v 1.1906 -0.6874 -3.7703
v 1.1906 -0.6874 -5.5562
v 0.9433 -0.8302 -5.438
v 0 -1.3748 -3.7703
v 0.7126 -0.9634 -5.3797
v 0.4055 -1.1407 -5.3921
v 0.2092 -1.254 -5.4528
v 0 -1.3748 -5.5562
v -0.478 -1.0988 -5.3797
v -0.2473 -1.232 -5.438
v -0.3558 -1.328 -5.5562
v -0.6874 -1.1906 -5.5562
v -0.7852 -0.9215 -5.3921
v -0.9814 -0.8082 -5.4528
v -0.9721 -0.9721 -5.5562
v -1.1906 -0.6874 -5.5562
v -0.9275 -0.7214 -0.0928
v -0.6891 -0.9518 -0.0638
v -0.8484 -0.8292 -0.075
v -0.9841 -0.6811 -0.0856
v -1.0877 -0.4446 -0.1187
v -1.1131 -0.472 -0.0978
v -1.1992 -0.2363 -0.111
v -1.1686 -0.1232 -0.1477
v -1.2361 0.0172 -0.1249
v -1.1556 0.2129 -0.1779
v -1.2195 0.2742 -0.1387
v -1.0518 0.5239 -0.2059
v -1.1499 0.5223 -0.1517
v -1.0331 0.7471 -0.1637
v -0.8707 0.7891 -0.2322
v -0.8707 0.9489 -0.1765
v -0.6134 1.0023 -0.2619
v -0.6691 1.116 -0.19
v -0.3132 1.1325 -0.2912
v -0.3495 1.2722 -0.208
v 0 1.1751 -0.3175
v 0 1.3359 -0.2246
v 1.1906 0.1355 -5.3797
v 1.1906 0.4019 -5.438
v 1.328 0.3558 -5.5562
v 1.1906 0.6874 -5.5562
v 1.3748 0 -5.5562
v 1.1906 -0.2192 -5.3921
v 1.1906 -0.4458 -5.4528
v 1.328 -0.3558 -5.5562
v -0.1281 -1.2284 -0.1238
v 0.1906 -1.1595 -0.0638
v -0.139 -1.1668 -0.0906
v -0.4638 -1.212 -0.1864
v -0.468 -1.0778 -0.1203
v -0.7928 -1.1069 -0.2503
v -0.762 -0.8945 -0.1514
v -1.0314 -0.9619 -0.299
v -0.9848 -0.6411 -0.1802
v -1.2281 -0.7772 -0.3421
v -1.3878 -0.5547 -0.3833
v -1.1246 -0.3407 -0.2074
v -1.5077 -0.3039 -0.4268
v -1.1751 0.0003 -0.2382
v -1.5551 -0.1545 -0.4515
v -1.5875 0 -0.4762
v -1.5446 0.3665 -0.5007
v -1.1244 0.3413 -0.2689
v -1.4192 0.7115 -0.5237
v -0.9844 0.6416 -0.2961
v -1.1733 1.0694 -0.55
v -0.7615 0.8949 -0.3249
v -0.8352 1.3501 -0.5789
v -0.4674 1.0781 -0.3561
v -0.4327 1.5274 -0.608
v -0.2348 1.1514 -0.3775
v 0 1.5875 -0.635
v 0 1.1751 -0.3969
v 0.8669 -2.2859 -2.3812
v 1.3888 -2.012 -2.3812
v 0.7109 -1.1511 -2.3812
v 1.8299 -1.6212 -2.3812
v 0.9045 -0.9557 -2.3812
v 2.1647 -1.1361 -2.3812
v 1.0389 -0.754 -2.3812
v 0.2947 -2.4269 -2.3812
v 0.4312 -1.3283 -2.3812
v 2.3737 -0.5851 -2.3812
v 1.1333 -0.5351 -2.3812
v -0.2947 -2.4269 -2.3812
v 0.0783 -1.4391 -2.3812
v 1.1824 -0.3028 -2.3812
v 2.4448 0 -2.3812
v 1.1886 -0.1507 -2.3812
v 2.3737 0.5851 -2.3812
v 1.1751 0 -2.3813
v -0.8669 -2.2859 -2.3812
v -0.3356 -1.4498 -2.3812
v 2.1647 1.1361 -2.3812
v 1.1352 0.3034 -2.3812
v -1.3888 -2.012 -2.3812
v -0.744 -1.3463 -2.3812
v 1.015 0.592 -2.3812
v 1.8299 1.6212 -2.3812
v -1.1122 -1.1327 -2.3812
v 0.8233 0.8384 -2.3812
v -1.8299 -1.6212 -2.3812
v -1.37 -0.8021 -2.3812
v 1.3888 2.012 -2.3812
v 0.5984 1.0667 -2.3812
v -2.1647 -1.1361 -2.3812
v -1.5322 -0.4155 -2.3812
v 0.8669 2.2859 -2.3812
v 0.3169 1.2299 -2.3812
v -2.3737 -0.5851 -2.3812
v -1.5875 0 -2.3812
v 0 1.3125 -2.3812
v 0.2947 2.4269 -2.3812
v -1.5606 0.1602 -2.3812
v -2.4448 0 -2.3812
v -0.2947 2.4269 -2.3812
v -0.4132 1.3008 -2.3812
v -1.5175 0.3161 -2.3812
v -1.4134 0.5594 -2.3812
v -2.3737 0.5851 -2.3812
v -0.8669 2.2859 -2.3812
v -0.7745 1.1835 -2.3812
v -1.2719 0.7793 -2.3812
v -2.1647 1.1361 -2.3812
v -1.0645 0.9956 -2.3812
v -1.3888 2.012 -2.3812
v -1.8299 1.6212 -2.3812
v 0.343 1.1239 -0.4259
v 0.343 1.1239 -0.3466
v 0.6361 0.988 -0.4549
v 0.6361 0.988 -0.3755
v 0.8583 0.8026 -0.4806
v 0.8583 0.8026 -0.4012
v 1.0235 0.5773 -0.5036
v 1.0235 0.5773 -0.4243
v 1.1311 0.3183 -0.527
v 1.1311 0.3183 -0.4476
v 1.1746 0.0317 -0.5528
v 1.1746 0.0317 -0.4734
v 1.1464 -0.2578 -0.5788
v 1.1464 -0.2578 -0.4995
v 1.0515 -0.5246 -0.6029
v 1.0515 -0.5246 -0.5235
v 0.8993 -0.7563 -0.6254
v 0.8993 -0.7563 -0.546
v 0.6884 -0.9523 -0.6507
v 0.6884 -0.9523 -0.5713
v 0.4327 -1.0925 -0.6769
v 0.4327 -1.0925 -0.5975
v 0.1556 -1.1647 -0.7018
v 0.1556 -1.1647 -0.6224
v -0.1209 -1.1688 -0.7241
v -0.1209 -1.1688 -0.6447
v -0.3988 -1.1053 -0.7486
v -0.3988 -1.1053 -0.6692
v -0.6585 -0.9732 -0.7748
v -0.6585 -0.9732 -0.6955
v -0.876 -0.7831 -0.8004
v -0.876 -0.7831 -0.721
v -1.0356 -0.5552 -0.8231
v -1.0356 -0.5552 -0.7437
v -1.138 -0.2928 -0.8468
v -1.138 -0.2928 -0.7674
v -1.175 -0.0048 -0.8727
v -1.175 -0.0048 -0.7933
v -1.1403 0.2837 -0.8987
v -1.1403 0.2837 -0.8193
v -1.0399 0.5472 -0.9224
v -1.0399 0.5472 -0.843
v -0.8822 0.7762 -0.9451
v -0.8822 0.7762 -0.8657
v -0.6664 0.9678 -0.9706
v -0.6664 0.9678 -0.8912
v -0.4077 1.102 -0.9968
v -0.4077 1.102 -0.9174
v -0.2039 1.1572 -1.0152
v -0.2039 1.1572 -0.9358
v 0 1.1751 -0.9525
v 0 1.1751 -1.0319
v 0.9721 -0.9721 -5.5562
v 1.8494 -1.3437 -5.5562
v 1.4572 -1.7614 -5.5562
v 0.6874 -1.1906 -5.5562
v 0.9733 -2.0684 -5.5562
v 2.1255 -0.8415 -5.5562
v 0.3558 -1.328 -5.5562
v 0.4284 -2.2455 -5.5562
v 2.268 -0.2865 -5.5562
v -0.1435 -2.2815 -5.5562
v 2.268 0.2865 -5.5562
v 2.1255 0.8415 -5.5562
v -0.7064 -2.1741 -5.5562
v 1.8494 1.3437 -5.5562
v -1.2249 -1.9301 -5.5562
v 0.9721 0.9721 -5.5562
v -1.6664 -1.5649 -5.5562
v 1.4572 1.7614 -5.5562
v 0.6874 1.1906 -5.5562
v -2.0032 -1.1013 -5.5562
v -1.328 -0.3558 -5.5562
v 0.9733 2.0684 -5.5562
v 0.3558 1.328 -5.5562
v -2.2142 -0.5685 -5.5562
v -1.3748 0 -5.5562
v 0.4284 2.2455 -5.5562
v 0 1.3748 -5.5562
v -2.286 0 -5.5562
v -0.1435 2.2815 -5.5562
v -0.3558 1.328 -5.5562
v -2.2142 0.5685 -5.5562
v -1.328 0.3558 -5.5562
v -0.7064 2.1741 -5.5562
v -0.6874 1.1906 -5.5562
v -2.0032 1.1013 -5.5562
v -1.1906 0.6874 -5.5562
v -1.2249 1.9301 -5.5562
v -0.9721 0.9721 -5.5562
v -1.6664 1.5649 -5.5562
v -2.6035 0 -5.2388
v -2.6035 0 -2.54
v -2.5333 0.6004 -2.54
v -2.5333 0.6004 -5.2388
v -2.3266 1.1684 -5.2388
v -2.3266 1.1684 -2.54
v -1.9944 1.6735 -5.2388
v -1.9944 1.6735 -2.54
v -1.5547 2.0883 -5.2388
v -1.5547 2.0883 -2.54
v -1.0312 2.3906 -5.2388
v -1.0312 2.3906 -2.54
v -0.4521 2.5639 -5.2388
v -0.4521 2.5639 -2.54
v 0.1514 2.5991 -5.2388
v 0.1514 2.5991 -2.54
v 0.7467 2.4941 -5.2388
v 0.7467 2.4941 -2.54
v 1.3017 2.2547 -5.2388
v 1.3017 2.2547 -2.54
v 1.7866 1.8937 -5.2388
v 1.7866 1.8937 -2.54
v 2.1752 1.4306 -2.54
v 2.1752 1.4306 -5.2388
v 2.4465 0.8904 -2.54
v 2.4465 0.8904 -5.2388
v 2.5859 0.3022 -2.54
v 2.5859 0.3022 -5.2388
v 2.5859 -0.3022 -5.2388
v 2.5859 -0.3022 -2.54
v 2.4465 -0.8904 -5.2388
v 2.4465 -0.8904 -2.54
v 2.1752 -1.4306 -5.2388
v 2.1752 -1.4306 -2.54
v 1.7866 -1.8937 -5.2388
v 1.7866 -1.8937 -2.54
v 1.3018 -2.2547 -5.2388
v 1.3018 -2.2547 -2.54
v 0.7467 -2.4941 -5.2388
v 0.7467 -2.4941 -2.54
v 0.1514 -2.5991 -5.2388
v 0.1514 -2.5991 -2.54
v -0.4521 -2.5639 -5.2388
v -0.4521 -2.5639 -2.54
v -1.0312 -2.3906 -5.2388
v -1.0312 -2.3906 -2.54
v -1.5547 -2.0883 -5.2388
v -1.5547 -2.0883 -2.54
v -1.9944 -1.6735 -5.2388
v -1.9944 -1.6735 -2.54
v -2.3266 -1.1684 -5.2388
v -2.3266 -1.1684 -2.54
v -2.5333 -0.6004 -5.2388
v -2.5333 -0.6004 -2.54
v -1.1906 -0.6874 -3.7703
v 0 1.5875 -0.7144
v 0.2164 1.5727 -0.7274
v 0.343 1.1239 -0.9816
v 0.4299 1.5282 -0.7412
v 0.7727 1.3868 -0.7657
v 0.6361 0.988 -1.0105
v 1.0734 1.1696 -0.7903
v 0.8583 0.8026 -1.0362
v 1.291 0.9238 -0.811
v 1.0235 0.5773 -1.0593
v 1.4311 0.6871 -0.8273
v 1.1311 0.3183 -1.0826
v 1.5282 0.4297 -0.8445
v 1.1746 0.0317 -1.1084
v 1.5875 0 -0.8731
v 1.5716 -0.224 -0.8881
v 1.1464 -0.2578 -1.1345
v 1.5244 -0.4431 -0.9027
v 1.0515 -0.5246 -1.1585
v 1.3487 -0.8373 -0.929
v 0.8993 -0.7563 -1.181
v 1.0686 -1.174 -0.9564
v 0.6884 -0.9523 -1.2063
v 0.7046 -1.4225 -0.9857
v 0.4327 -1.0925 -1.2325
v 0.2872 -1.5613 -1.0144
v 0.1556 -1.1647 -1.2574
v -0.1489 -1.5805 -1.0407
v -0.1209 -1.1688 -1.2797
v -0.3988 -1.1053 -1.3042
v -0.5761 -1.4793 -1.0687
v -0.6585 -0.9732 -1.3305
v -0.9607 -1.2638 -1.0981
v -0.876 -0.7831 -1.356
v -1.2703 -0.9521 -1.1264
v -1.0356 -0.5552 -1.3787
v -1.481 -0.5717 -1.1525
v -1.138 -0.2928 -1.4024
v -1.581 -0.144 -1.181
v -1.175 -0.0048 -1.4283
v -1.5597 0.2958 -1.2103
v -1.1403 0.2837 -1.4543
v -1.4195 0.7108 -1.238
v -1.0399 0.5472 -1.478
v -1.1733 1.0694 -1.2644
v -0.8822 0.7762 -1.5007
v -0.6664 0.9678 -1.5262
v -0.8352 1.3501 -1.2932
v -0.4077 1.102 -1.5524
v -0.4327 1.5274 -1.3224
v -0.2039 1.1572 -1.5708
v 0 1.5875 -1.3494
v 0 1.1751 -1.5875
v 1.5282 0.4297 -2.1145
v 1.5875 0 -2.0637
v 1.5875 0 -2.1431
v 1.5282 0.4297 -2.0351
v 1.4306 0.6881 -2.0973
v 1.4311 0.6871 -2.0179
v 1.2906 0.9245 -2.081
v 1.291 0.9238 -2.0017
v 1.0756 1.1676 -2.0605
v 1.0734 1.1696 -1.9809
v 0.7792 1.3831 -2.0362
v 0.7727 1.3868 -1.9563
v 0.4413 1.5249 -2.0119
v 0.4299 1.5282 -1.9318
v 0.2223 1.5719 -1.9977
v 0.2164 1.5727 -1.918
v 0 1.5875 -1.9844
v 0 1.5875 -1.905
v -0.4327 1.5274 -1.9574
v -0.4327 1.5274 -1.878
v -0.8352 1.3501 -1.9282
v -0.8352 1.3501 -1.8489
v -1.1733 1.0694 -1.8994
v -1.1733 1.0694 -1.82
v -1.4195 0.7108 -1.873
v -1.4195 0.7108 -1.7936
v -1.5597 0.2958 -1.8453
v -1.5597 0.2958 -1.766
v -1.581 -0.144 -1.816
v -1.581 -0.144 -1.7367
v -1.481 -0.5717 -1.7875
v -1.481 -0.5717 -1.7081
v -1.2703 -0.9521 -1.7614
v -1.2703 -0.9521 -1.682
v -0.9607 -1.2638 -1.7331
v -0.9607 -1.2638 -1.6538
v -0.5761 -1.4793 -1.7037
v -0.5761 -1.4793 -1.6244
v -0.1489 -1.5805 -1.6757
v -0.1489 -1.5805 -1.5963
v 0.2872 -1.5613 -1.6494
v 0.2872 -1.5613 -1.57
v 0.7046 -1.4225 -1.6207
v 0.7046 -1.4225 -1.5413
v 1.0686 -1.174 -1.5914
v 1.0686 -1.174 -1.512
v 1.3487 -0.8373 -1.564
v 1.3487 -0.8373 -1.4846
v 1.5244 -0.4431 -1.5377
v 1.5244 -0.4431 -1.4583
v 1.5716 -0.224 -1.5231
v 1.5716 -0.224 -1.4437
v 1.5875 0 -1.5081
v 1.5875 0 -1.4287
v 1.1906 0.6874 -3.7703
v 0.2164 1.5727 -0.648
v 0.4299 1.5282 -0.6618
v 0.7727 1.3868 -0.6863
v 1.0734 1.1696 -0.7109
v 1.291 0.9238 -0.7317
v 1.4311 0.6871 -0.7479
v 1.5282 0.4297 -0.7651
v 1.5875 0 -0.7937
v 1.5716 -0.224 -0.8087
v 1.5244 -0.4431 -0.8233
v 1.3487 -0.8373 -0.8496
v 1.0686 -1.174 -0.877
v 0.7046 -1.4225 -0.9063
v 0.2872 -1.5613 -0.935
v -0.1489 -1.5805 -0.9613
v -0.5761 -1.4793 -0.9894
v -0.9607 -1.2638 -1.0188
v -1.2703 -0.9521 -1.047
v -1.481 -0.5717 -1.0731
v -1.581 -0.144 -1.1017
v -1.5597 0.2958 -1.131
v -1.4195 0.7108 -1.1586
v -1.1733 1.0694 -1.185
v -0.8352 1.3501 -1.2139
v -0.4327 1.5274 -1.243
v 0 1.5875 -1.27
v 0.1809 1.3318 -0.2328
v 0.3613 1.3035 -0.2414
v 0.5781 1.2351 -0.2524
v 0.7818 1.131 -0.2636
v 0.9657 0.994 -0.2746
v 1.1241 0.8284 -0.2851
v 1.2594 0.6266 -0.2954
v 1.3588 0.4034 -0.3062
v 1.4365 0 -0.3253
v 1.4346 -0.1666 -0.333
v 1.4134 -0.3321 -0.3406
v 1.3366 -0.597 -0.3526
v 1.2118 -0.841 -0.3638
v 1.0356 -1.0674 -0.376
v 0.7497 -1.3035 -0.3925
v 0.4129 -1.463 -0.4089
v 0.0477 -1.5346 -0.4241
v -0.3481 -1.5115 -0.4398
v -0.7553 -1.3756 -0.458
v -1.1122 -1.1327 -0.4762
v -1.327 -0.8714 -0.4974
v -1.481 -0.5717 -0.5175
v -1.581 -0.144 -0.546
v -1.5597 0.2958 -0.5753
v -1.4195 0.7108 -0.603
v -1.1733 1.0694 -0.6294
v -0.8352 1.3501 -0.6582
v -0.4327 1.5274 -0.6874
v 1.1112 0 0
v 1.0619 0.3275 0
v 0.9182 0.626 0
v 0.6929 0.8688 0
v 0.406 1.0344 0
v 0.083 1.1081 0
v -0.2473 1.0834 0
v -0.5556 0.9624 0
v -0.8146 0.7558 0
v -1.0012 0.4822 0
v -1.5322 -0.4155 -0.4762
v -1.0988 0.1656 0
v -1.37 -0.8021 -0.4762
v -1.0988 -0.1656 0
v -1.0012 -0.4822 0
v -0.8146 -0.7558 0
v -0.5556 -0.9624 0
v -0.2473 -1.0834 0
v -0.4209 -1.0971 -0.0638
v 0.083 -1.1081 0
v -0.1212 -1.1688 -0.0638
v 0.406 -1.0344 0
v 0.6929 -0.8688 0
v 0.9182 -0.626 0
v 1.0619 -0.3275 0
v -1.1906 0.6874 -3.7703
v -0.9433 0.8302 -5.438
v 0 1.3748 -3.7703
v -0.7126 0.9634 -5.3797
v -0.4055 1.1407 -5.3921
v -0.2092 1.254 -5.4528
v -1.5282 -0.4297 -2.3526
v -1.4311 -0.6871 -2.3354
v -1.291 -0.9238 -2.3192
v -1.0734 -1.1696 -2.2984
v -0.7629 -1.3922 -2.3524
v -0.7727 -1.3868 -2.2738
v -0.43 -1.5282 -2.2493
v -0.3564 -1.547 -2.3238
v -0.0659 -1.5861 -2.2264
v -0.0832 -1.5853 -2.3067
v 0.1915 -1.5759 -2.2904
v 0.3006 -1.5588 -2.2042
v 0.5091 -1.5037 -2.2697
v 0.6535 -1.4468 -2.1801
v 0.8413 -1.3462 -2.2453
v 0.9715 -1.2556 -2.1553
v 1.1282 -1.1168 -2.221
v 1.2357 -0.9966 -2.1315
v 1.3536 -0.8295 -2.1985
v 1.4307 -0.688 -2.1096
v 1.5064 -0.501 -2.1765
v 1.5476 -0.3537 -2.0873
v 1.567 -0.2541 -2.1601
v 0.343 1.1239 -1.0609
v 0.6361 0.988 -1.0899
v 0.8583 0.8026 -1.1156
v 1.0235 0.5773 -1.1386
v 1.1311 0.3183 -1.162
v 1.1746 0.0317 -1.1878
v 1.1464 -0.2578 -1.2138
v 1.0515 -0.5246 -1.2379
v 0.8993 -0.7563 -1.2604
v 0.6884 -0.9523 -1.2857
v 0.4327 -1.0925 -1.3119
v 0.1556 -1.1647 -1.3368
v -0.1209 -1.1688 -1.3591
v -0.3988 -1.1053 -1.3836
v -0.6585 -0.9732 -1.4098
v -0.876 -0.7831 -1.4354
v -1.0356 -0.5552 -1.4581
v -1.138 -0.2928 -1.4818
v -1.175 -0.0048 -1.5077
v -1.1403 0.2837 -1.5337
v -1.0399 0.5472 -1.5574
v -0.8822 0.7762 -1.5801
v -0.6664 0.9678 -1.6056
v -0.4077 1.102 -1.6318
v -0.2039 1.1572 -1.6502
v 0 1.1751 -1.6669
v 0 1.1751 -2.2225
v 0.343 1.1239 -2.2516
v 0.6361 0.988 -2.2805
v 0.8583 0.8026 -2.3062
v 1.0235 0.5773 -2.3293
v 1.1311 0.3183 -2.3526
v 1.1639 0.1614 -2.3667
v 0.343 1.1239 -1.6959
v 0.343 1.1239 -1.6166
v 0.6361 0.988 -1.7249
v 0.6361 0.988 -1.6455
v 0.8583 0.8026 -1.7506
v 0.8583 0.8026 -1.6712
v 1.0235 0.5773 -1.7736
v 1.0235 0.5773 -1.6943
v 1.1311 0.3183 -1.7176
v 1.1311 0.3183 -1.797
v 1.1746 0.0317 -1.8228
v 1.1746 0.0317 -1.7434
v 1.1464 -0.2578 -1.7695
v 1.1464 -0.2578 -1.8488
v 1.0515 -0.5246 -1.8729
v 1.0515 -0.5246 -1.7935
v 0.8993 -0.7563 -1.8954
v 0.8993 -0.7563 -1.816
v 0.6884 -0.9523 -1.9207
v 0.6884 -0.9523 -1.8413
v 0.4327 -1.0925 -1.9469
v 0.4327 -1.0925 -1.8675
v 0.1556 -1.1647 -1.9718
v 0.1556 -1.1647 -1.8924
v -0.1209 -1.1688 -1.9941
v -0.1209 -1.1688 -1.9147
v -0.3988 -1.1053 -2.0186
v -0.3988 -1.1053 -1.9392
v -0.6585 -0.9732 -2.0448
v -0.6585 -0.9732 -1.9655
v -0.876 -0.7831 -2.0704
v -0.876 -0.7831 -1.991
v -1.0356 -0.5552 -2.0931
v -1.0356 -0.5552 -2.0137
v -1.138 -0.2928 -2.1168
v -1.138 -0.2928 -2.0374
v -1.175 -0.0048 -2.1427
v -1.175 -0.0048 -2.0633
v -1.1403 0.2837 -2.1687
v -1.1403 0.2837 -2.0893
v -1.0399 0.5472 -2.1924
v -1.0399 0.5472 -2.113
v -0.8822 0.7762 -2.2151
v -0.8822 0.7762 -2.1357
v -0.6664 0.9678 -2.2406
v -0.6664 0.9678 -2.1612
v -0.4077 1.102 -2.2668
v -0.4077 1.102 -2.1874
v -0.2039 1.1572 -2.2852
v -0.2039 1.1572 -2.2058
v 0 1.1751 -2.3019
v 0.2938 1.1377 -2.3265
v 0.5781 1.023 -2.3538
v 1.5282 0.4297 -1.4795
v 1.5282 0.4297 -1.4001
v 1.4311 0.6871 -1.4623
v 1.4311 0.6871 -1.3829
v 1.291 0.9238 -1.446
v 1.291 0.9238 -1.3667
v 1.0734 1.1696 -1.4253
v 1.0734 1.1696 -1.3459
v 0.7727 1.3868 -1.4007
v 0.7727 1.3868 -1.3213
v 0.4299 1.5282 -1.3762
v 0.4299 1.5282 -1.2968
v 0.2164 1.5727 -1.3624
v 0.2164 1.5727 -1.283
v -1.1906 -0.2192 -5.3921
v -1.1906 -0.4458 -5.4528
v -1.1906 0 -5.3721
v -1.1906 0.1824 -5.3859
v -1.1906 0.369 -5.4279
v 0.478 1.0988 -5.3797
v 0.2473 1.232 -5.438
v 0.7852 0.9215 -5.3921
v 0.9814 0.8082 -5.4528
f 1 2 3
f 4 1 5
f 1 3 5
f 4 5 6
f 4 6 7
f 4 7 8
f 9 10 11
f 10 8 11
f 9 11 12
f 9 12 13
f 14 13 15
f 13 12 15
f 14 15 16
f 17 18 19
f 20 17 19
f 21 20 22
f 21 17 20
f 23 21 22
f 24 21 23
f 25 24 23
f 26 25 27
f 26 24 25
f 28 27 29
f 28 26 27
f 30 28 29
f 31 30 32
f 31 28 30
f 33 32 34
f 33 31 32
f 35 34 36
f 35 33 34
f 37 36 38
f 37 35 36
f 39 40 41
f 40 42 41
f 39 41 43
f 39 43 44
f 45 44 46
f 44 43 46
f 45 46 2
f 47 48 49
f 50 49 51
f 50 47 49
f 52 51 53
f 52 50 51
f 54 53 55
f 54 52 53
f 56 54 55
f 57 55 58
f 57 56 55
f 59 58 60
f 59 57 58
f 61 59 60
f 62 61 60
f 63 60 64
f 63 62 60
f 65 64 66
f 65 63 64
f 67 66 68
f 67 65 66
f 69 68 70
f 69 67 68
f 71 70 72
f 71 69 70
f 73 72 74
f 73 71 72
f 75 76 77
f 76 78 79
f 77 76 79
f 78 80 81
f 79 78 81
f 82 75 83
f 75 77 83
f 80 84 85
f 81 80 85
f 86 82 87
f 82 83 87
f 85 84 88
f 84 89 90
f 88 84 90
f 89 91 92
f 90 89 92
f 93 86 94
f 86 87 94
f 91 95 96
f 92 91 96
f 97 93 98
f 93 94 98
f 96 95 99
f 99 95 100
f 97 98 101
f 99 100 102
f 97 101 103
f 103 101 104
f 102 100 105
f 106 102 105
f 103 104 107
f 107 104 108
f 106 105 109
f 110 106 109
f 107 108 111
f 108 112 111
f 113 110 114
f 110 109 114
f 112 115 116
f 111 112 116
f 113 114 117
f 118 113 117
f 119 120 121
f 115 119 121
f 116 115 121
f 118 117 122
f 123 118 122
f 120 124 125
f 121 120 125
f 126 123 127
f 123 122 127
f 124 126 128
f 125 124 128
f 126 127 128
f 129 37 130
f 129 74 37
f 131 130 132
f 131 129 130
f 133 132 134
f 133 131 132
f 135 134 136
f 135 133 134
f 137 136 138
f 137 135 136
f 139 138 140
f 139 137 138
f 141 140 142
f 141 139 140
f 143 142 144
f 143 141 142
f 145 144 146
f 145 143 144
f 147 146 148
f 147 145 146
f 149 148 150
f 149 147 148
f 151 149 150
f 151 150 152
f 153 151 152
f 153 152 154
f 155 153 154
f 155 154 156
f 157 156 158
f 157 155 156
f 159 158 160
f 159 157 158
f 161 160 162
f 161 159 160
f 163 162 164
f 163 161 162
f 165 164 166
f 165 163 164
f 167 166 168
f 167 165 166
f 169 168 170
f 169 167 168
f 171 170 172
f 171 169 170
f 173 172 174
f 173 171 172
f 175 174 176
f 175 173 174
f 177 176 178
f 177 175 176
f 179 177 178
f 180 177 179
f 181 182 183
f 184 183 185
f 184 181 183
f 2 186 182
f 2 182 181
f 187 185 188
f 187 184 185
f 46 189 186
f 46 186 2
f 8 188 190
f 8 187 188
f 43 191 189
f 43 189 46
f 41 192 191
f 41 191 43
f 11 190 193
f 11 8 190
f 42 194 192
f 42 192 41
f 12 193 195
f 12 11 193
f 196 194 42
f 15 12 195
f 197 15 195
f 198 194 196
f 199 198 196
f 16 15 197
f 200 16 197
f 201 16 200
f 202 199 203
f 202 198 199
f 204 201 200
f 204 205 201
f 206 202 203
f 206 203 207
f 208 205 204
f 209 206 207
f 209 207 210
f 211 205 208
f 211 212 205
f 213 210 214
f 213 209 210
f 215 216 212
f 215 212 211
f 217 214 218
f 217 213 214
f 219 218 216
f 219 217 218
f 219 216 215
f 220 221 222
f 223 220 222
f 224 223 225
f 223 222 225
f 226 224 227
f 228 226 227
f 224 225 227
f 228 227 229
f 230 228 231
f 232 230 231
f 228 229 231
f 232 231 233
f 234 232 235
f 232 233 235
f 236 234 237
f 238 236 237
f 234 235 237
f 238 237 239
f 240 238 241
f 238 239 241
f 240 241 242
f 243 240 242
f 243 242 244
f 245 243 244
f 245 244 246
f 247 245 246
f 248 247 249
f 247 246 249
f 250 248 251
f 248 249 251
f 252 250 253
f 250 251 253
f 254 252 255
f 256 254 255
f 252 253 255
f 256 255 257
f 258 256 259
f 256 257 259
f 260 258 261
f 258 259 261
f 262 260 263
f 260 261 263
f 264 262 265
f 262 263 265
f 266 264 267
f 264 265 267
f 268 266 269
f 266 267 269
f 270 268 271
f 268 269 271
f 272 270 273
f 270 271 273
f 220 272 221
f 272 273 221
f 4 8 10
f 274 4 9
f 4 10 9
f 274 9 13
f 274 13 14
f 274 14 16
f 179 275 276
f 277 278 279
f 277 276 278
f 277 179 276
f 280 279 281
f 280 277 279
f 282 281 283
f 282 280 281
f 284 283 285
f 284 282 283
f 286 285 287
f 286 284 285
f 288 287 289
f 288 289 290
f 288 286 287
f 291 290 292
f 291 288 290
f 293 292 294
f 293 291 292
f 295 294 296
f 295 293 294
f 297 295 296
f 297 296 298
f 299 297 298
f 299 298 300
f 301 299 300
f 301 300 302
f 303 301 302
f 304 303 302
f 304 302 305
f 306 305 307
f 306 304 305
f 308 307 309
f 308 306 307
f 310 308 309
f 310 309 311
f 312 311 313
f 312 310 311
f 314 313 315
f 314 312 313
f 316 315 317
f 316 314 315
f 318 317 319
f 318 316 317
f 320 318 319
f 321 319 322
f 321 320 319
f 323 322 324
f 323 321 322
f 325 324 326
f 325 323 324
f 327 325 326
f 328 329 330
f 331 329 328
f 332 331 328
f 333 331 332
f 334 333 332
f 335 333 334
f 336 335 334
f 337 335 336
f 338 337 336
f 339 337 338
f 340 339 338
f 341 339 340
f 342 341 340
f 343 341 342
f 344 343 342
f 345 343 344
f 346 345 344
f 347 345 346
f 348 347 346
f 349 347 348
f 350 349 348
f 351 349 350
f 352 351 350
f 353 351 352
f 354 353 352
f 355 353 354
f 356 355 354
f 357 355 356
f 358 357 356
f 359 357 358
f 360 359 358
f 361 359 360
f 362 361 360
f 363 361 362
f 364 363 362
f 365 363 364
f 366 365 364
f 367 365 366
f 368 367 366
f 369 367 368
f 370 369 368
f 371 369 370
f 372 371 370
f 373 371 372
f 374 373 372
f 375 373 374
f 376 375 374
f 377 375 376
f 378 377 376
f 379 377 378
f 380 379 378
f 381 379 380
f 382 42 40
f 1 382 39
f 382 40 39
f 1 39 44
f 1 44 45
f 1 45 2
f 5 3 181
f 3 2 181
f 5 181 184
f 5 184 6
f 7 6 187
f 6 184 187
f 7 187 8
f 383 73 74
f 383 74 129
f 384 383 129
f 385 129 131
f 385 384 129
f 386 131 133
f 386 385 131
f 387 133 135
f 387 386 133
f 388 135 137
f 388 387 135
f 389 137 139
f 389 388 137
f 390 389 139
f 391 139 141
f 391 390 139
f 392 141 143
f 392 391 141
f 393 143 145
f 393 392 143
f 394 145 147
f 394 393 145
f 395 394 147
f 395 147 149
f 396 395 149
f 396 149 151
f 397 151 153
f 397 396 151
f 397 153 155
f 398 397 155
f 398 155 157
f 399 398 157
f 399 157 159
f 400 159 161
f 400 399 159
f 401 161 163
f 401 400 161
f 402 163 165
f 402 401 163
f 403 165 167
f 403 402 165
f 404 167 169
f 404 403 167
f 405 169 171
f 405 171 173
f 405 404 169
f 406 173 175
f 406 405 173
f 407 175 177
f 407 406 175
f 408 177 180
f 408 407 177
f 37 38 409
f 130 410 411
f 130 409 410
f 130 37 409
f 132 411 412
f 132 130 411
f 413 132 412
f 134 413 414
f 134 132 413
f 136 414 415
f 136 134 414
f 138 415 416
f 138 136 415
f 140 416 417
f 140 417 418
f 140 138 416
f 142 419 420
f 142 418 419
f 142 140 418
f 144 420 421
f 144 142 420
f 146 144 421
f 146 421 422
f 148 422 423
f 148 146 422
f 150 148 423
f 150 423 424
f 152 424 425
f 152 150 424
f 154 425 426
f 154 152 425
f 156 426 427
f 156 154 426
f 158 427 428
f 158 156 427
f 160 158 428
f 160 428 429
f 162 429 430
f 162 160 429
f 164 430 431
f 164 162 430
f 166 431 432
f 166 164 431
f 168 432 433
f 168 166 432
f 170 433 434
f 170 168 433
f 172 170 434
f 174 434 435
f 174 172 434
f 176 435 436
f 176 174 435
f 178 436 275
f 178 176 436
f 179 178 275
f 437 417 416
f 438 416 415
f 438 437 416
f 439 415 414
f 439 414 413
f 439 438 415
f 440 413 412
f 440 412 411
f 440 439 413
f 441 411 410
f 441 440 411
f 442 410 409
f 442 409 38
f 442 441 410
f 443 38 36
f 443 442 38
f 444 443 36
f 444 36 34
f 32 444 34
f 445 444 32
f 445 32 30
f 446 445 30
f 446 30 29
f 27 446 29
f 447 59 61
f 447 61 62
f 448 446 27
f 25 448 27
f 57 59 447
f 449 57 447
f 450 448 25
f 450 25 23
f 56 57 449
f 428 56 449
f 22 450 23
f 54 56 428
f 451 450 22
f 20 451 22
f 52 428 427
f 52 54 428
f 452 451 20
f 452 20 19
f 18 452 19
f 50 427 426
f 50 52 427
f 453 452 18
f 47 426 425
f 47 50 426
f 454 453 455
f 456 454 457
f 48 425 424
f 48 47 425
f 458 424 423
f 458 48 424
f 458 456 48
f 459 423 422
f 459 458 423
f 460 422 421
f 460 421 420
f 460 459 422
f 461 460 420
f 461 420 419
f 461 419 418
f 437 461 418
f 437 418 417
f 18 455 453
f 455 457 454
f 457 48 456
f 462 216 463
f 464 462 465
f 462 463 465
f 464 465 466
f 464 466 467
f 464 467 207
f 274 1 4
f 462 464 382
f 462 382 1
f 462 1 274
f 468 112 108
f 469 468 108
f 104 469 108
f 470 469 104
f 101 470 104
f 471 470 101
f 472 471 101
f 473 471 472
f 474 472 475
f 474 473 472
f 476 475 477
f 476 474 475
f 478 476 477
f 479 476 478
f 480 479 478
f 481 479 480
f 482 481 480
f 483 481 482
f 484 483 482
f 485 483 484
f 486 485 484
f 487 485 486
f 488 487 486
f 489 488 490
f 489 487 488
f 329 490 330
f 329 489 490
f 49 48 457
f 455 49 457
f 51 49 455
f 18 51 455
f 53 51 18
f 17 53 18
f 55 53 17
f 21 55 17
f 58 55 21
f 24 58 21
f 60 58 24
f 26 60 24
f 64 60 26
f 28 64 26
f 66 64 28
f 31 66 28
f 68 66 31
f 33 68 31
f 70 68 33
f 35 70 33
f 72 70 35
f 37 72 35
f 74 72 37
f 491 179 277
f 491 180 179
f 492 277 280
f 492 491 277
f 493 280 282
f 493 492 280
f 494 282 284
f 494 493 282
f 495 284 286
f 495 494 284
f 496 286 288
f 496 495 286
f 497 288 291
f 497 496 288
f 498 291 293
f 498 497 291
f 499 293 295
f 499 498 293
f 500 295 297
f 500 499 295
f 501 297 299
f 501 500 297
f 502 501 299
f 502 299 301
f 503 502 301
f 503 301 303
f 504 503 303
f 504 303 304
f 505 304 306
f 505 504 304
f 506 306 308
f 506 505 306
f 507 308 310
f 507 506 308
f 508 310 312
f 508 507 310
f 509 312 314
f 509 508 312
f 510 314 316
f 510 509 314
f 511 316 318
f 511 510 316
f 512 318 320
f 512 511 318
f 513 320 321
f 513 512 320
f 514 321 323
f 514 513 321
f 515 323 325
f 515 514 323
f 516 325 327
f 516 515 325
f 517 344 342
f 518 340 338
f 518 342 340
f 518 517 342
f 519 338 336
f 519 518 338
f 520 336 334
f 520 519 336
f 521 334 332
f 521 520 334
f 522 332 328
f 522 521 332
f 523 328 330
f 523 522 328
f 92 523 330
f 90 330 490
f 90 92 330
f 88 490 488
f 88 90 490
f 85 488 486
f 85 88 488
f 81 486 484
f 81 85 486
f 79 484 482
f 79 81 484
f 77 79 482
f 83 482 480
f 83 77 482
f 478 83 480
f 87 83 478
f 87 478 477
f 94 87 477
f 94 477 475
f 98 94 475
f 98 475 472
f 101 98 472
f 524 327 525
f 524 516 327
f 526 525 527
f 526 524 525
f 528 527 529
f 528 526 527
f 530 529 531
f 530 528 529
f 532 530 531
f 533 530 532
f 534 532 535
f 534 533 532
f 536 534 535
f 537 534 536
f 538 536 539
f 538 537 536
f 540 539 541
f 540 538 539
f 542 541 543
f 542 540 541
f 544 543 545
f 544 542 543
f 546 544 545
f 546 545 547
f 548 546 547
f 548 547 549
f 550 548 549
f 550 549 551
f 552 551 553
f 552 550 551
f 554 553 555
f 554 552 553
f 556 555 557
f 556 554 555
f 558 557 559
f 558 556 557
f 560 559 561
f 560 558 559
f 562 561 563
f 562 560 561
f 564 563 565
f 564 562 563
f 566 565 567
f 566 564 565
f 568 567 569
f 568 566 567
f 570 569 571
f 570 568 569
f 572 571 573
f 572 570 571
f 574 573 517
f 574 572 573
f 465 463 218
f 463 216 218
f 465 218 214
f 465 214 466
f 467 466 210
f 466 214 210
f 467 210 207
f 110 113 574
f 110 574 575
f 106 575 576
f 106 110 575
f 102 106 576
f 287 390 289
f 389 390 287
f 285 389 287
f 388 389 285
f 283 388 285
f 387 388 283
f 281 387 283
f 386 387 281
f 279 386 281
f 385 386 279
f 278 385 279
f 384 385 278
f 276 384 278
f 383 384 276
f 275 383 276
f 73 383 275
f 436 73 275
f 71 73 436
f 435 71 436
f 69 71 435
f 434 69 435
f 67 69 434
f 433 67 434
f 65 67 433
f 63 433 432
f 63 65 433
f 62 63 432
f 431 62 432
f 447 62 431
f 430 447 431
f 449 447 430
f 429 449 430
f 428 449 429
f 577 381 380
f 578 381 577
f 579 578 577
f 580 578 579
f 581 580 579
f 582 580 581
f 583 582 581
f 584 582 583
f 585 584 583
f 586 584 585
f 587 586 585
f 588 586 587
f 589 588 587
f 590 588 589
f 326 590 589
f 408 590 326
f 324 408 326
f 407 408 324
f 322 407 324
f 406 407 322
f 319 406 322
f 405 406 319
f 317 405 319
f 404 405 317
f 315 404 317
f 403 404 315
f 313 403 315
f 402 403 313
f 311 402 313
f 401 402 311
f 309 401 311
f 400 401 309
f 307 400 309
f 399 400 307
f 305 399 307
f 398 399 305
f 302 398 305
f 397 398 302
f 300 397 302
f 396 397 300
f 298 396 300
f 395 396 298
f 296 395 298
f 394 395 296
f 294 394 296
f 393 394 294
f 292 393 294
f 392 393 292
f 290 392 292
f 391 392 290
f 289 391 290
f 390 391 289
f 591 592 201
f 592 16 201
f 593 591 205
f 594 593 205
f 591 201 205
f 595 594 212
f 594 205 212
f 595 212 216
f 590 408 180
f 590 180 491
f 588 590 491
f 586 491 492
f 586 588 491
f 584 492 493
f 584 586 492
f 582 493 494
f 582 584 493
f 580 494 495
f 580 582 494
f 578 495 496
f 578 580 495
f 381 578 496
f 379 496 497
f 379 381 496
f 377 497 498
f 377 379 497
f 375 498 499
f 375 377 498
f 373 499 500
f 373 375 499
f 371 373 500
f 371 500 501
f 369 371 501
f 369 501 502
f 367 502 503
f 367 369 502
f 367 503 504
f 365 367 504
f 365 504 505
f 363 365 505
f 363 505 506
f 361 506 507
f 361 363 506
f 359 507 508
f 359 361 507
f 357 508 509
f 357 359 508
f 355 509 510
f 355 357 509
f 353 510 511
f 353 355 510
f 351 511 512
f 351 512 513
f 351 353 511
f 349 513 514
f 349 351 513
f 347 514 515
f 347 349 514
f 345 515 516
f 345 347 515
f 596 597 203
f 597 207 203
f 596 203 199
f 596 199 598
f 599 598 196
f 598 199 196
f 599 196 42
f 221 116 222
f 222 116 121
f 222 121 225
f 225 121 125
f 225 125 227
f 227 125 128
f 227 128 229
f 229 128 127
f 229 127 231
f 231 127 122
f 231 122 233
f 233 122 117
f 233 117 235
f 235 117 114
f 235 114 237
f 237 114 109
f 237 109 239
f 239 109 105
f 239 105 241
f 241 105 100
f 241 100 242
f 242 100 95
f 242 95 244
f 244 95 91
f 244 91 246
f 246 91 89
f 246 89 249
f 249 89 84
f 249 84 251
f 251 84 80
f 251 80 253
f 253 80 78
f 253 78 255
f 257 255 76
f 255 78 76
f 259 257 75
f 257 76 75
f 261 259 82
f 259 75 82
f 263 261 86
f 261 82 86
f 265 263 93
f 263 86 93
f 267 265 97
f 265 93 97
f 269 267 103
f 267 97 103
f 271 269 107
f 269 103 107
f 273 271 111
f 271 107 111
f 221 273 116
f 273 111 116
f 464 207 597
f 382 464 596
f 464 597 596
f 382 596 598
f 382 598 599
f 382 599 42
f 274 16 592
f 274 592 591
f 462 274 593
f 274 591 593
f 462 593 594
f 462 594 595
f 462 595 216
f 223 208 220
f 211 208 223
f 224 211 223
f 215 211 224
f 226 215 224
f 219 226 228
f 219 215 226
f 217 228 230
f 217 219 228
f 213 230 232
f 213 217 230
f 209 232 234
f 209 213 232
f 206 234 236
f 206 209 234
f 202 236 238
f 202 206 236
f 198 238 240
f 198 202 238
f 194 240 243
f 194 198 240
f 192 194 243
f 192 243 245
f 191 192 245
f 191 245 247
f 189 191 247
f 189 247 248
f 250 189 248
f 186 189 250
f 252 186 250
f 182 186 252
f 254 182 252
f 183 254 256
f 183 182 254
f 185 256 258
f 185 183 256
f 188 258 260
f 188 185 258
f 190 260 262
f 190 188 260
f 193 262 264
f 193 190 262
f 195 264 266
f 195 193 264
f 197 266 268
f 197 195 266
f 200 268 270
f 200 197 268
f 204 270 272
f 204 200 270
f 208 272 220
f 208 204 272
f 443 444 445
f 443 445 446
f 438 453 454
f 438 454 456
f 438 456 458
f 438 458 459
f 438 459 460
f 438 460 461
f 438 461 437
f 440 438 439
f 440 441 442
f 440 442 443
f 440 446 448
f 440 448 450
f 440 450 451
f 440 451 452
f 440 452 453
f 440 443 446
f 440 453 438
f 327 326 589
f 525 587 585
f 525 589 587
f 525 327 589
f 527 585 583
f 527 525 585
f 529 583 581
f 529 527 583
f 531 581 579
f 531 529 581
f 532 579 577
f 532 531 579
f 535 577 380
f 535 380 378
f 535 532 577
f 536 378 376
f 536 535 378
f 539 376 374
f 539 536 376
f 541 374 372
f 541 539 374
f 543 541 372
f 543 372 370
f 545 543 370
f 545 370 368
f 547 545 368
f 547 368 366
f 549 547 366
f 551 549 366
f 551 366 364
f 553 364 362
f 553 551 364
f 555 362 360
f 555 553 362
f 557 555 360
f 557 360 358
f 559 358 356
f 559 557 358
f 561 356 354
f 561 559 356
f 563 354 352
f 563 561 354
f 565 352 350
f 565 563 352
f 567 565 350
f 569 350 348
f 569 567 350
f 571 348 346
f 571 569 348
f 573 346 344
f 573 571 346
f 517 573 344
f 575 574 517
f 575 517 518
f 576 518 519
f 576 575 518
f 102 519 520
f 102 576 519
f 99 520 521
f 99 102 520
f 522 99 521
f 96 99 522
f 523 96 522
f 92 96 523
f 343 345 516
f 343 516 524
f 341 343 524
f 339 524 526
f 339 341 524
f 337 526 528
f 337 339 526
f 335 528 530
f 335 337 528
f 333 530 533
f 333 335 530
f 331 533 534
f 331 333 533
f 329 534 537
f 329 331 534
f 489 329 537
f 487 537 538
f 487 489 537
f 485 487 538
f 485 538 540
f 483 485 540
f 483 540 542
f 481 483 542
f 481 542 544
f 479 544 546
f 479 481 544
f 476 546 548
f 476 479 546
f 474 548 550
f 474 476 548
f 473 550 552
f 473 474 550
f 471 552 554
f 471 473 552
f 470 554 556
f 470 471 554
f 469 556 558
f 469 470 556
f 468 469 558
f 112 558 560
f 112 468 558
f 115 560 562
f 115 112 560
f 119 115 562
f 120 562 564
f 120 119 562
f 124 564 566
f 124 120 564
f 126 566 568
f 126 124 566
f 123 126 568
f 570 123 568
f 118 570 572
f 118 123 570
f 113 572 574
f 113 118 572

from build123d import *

# Parameters (mm, degrees)
SKETCH1_R          = 1.5875
EXTRUDE1_DEPTH     = 2.38125
CHAMFER3_SIZE      = 0.47625
CUT_SWEEP1_PITCH   = 0.635
SKETCH6_R          = 2.6035
EXTRUDE2_DEPTH     = 3.175
CUT_EXTRUDE1_DEPTH = 1.7859375
SKETCH8_R          = 1.374815329
CUT_EXTRUDE2_DEPTH = 0.3175
CUT_EXTRUDE2_DRAFT = -45
CHAMFER1_SIZE      = 0.3175
CHAMFER2_SIZE      = 0.15875


with BuildPart() as part:
    # Sketch1 → Extrude1 (new body)
    with BuildSketch(Plane.XY):
        Circle(SKETCH1_R)
    extrude(amount=-EXTRUDE1_DEPTH)

    # Chamfer3
    chamfer3_edges = [part.edges().sort_by_distance(p)[0] for p in [
        (-1.5875, 0, 0),
    ]]
    chamfer(chamfer3_edges, length=CHAMFER3_SIZE)

    # Cut-Sweep1: the profile of Sketch3 profile screwed along a right-hand helix of 4.75 turns, 6 arcs to a turn; built about Z, then put on its axis
    cut_sweep1_z = Axis((0, 0, 0), (0, 0, 1))
    cut_sweep1_corners = [(1.5878, 0, -0.555798205), (1.175055401, 0, -0.3175), (1.175055401, 0, -0.238125), (1.5878, 0, 0.000173205)]
    with BuildLine(mode=Mode.PRIVATE) as cut_sweep1_profile:
        Line(cut_sweep1_corners[0], cut_sweep1_corners[1])
        Line(cut_sweep1_corners[1], cut_sweep1_corners[2])
        Line(cut_sweep1_corners[2], cut_sweep1_corners[3])
        Line(cut_sweep1_corners[3], cut_sweep1_corners[0])
    cut_sweep1_cap = Face(cut_sweep1_profile.wire())
    cut_sweep1_turn_angles = [0, 30, 60, 90, 120, 150, 180, 210, 240, 270, 300, 330, 360]
    cut_sweep1_turn_weights = [1, 0.8660254037844387, 1, 0.8660254037844387, 1, 0.8660254037844387, 1, 0.8660254037844387, 1, 0.8660254037844387, 1, 0.8660254037844387, 1]
    cut_sweep1_turn_rails = [Edge.make_bspline([Vector(p[0], p[1], 0).rotate(cut_sweep1_z, cut_sweep1_turn_angles[k]) / cut_sweep1_turn_weights[k] + Vector(0, 0, p[2] + CUT_SWEEP1_PITCH * cut_sweep1_turn_angles[k] / 360) for k in range(13)], [0, 0, 0, 1, 1, 2, 2, 3, 3, 4, 4, 5, 5, 6, 6, 6], 2, cut_sweep1_turn_weights) for p in cut_sweep1_corners]
    cut_sweep1_turn_sides = [Face.make_surface_from_curves(cut_sweep1_turn_rails[p[0]], cut_sweep1_turn_rails[p[1]]) for p in [(0, 1), (1, 2), (2, 3), (3, 0)]]
    cut_sweep1_last_angles = [1440, 1470, 1500, 1530, 1560, 1590, 1620, 1650, 1680, 1695, 1710]
    cut_sweep1_last_weights = [1, 0.8660254037844387, 1, 0.8660254037844387, 1, 0.8660254037844387, 1, 0.8660254037844387, 1, 0.9659258262890595, 1]
    cut_sweep1_last_rails = [Edge.make_bspline([Vector(p[0], p[1], 0).rotate(cut_sweep1_z, cut_sweep1_last_angles[k]) / cut_sweep1_last_weights[k] + Vector(0, 0, p[2] + CUT_SWEEP1_PITCH * cut_sweep1_last_angles[k] / 360) for k in range(11)], [0, 0, 0, 1, 1, 2, 2, 3, 3, 4, 4, 5, 5, 5], 2, cut_sweep1_last_weights) for p in cut_sweep1_corners]
    cut_sweep1_last_sides = [Face.make_surface_from_curves(cut_sweep1_last_rails[p[0]], cut_sweep1_last_rails[p[1]]) for p in [(0, 1), (1, 2), (2, 3), (3, 0)]]
    cut_sweep1 = Plane(origin=(0, 0, 0), x_dir=(0, 1, 0), z_dir=(0, 0, -1)) * Solid(Shell([*[p.moved(Location((0, 0, CUT_SWEEP1_PITCH * i))) for i in range(4) for p in cut_sweep1_turn_sides], *cut_sweep1_last_sides, cut_sweep1_cap, cut_sweep1_cap.rotate(cut_sweep1_z, 1710).moved(Location((0, 0, CUT_SWEEP1_PITCH * 1710 / 360)))]))
    add(cut_sweep1, mode=Mode.SUBTRACT)

    # Sketch6 → Extrude2 (add)
    with BuildSketch(Plane(origin=(0, 0, -2.38125), x_dir=(-1, 0, 0), z_dir=(0, 0, -1))):
        Circle(SKETCH6_R)
    extrude(amount=EXTRUDE2_DEPTH)

    # Sketch7 → Cut-Extrude1 (cut)
    with BuildSketch(Plane(origin=(0, 0, -5.55625), x_dir=(-1, 0, 0), z_dir=(0, 0, -1))):
        Polygon((0, 1.374815329), (-1.190625, 0.687407664), (-1.190625, -0.687407664), (0, -1.374815329), (1.190625, -0.687407664), (1.190625, 0.687407664), align=None)
    extrude(amount=-CUT_EXTRUDE1_DEPTH, mode=Mode.SUBTRACT)


with BuildPart() as cut_extrude2_tool:
    # Sketch8 → Cut-Extrude2 (with draft: the straight prism first)
    with BuildSketch(Plane(origin=(0, 0, -5.55625), x_dir=(-1, 0, 0), z_dir=(0, 0, -1))):
        Circle(SKETCH8_R)
    extrude(amount=-CUT_EXTRUDE2_DEPTH)
    # Cut-Extrude2: the draft: its side faces are tilted about the plane it starts from
    cut_extrude2_sides = [cut_extrude2_tool.faces().sort_by_distance(p)[0] for p in [
        (1.374815329, 0, -5.3975),
    ]]
    draft(cut_extrude2_sides, Plane(origin=(0, 0, -5.55625), x_dir=(-1, 0, 0), z_dir=(0, 0, -1)), CUT_EXTRUDE2_DRAFT)


with BuildPart() as part_1:
    add(part.part)

    # Cut-Extrude2: cut by cut_extrude2_tool
    add(cut_extrude2_tool.part, mode=Mode.SUBTRACT)

    # Chamfer1
    chamfer1_edges = [part_1.edges().sort_by_distance(p)[0] for p in [
        (2.6035, 0, -5.55625),
    ]]
    chamfer(chamfer1_edges, length=CHAMFER1_SIZE)

    # Chamfer2
    chamfer2_edges = [part_1.edges().sort_by_distance(p)[0] for p in [
        (2.6035, 0, -2.38125),
    ]]
    chamfer(chamfer2_edges, length=CHAMFER2_SIZE)


solid = part_1.part
